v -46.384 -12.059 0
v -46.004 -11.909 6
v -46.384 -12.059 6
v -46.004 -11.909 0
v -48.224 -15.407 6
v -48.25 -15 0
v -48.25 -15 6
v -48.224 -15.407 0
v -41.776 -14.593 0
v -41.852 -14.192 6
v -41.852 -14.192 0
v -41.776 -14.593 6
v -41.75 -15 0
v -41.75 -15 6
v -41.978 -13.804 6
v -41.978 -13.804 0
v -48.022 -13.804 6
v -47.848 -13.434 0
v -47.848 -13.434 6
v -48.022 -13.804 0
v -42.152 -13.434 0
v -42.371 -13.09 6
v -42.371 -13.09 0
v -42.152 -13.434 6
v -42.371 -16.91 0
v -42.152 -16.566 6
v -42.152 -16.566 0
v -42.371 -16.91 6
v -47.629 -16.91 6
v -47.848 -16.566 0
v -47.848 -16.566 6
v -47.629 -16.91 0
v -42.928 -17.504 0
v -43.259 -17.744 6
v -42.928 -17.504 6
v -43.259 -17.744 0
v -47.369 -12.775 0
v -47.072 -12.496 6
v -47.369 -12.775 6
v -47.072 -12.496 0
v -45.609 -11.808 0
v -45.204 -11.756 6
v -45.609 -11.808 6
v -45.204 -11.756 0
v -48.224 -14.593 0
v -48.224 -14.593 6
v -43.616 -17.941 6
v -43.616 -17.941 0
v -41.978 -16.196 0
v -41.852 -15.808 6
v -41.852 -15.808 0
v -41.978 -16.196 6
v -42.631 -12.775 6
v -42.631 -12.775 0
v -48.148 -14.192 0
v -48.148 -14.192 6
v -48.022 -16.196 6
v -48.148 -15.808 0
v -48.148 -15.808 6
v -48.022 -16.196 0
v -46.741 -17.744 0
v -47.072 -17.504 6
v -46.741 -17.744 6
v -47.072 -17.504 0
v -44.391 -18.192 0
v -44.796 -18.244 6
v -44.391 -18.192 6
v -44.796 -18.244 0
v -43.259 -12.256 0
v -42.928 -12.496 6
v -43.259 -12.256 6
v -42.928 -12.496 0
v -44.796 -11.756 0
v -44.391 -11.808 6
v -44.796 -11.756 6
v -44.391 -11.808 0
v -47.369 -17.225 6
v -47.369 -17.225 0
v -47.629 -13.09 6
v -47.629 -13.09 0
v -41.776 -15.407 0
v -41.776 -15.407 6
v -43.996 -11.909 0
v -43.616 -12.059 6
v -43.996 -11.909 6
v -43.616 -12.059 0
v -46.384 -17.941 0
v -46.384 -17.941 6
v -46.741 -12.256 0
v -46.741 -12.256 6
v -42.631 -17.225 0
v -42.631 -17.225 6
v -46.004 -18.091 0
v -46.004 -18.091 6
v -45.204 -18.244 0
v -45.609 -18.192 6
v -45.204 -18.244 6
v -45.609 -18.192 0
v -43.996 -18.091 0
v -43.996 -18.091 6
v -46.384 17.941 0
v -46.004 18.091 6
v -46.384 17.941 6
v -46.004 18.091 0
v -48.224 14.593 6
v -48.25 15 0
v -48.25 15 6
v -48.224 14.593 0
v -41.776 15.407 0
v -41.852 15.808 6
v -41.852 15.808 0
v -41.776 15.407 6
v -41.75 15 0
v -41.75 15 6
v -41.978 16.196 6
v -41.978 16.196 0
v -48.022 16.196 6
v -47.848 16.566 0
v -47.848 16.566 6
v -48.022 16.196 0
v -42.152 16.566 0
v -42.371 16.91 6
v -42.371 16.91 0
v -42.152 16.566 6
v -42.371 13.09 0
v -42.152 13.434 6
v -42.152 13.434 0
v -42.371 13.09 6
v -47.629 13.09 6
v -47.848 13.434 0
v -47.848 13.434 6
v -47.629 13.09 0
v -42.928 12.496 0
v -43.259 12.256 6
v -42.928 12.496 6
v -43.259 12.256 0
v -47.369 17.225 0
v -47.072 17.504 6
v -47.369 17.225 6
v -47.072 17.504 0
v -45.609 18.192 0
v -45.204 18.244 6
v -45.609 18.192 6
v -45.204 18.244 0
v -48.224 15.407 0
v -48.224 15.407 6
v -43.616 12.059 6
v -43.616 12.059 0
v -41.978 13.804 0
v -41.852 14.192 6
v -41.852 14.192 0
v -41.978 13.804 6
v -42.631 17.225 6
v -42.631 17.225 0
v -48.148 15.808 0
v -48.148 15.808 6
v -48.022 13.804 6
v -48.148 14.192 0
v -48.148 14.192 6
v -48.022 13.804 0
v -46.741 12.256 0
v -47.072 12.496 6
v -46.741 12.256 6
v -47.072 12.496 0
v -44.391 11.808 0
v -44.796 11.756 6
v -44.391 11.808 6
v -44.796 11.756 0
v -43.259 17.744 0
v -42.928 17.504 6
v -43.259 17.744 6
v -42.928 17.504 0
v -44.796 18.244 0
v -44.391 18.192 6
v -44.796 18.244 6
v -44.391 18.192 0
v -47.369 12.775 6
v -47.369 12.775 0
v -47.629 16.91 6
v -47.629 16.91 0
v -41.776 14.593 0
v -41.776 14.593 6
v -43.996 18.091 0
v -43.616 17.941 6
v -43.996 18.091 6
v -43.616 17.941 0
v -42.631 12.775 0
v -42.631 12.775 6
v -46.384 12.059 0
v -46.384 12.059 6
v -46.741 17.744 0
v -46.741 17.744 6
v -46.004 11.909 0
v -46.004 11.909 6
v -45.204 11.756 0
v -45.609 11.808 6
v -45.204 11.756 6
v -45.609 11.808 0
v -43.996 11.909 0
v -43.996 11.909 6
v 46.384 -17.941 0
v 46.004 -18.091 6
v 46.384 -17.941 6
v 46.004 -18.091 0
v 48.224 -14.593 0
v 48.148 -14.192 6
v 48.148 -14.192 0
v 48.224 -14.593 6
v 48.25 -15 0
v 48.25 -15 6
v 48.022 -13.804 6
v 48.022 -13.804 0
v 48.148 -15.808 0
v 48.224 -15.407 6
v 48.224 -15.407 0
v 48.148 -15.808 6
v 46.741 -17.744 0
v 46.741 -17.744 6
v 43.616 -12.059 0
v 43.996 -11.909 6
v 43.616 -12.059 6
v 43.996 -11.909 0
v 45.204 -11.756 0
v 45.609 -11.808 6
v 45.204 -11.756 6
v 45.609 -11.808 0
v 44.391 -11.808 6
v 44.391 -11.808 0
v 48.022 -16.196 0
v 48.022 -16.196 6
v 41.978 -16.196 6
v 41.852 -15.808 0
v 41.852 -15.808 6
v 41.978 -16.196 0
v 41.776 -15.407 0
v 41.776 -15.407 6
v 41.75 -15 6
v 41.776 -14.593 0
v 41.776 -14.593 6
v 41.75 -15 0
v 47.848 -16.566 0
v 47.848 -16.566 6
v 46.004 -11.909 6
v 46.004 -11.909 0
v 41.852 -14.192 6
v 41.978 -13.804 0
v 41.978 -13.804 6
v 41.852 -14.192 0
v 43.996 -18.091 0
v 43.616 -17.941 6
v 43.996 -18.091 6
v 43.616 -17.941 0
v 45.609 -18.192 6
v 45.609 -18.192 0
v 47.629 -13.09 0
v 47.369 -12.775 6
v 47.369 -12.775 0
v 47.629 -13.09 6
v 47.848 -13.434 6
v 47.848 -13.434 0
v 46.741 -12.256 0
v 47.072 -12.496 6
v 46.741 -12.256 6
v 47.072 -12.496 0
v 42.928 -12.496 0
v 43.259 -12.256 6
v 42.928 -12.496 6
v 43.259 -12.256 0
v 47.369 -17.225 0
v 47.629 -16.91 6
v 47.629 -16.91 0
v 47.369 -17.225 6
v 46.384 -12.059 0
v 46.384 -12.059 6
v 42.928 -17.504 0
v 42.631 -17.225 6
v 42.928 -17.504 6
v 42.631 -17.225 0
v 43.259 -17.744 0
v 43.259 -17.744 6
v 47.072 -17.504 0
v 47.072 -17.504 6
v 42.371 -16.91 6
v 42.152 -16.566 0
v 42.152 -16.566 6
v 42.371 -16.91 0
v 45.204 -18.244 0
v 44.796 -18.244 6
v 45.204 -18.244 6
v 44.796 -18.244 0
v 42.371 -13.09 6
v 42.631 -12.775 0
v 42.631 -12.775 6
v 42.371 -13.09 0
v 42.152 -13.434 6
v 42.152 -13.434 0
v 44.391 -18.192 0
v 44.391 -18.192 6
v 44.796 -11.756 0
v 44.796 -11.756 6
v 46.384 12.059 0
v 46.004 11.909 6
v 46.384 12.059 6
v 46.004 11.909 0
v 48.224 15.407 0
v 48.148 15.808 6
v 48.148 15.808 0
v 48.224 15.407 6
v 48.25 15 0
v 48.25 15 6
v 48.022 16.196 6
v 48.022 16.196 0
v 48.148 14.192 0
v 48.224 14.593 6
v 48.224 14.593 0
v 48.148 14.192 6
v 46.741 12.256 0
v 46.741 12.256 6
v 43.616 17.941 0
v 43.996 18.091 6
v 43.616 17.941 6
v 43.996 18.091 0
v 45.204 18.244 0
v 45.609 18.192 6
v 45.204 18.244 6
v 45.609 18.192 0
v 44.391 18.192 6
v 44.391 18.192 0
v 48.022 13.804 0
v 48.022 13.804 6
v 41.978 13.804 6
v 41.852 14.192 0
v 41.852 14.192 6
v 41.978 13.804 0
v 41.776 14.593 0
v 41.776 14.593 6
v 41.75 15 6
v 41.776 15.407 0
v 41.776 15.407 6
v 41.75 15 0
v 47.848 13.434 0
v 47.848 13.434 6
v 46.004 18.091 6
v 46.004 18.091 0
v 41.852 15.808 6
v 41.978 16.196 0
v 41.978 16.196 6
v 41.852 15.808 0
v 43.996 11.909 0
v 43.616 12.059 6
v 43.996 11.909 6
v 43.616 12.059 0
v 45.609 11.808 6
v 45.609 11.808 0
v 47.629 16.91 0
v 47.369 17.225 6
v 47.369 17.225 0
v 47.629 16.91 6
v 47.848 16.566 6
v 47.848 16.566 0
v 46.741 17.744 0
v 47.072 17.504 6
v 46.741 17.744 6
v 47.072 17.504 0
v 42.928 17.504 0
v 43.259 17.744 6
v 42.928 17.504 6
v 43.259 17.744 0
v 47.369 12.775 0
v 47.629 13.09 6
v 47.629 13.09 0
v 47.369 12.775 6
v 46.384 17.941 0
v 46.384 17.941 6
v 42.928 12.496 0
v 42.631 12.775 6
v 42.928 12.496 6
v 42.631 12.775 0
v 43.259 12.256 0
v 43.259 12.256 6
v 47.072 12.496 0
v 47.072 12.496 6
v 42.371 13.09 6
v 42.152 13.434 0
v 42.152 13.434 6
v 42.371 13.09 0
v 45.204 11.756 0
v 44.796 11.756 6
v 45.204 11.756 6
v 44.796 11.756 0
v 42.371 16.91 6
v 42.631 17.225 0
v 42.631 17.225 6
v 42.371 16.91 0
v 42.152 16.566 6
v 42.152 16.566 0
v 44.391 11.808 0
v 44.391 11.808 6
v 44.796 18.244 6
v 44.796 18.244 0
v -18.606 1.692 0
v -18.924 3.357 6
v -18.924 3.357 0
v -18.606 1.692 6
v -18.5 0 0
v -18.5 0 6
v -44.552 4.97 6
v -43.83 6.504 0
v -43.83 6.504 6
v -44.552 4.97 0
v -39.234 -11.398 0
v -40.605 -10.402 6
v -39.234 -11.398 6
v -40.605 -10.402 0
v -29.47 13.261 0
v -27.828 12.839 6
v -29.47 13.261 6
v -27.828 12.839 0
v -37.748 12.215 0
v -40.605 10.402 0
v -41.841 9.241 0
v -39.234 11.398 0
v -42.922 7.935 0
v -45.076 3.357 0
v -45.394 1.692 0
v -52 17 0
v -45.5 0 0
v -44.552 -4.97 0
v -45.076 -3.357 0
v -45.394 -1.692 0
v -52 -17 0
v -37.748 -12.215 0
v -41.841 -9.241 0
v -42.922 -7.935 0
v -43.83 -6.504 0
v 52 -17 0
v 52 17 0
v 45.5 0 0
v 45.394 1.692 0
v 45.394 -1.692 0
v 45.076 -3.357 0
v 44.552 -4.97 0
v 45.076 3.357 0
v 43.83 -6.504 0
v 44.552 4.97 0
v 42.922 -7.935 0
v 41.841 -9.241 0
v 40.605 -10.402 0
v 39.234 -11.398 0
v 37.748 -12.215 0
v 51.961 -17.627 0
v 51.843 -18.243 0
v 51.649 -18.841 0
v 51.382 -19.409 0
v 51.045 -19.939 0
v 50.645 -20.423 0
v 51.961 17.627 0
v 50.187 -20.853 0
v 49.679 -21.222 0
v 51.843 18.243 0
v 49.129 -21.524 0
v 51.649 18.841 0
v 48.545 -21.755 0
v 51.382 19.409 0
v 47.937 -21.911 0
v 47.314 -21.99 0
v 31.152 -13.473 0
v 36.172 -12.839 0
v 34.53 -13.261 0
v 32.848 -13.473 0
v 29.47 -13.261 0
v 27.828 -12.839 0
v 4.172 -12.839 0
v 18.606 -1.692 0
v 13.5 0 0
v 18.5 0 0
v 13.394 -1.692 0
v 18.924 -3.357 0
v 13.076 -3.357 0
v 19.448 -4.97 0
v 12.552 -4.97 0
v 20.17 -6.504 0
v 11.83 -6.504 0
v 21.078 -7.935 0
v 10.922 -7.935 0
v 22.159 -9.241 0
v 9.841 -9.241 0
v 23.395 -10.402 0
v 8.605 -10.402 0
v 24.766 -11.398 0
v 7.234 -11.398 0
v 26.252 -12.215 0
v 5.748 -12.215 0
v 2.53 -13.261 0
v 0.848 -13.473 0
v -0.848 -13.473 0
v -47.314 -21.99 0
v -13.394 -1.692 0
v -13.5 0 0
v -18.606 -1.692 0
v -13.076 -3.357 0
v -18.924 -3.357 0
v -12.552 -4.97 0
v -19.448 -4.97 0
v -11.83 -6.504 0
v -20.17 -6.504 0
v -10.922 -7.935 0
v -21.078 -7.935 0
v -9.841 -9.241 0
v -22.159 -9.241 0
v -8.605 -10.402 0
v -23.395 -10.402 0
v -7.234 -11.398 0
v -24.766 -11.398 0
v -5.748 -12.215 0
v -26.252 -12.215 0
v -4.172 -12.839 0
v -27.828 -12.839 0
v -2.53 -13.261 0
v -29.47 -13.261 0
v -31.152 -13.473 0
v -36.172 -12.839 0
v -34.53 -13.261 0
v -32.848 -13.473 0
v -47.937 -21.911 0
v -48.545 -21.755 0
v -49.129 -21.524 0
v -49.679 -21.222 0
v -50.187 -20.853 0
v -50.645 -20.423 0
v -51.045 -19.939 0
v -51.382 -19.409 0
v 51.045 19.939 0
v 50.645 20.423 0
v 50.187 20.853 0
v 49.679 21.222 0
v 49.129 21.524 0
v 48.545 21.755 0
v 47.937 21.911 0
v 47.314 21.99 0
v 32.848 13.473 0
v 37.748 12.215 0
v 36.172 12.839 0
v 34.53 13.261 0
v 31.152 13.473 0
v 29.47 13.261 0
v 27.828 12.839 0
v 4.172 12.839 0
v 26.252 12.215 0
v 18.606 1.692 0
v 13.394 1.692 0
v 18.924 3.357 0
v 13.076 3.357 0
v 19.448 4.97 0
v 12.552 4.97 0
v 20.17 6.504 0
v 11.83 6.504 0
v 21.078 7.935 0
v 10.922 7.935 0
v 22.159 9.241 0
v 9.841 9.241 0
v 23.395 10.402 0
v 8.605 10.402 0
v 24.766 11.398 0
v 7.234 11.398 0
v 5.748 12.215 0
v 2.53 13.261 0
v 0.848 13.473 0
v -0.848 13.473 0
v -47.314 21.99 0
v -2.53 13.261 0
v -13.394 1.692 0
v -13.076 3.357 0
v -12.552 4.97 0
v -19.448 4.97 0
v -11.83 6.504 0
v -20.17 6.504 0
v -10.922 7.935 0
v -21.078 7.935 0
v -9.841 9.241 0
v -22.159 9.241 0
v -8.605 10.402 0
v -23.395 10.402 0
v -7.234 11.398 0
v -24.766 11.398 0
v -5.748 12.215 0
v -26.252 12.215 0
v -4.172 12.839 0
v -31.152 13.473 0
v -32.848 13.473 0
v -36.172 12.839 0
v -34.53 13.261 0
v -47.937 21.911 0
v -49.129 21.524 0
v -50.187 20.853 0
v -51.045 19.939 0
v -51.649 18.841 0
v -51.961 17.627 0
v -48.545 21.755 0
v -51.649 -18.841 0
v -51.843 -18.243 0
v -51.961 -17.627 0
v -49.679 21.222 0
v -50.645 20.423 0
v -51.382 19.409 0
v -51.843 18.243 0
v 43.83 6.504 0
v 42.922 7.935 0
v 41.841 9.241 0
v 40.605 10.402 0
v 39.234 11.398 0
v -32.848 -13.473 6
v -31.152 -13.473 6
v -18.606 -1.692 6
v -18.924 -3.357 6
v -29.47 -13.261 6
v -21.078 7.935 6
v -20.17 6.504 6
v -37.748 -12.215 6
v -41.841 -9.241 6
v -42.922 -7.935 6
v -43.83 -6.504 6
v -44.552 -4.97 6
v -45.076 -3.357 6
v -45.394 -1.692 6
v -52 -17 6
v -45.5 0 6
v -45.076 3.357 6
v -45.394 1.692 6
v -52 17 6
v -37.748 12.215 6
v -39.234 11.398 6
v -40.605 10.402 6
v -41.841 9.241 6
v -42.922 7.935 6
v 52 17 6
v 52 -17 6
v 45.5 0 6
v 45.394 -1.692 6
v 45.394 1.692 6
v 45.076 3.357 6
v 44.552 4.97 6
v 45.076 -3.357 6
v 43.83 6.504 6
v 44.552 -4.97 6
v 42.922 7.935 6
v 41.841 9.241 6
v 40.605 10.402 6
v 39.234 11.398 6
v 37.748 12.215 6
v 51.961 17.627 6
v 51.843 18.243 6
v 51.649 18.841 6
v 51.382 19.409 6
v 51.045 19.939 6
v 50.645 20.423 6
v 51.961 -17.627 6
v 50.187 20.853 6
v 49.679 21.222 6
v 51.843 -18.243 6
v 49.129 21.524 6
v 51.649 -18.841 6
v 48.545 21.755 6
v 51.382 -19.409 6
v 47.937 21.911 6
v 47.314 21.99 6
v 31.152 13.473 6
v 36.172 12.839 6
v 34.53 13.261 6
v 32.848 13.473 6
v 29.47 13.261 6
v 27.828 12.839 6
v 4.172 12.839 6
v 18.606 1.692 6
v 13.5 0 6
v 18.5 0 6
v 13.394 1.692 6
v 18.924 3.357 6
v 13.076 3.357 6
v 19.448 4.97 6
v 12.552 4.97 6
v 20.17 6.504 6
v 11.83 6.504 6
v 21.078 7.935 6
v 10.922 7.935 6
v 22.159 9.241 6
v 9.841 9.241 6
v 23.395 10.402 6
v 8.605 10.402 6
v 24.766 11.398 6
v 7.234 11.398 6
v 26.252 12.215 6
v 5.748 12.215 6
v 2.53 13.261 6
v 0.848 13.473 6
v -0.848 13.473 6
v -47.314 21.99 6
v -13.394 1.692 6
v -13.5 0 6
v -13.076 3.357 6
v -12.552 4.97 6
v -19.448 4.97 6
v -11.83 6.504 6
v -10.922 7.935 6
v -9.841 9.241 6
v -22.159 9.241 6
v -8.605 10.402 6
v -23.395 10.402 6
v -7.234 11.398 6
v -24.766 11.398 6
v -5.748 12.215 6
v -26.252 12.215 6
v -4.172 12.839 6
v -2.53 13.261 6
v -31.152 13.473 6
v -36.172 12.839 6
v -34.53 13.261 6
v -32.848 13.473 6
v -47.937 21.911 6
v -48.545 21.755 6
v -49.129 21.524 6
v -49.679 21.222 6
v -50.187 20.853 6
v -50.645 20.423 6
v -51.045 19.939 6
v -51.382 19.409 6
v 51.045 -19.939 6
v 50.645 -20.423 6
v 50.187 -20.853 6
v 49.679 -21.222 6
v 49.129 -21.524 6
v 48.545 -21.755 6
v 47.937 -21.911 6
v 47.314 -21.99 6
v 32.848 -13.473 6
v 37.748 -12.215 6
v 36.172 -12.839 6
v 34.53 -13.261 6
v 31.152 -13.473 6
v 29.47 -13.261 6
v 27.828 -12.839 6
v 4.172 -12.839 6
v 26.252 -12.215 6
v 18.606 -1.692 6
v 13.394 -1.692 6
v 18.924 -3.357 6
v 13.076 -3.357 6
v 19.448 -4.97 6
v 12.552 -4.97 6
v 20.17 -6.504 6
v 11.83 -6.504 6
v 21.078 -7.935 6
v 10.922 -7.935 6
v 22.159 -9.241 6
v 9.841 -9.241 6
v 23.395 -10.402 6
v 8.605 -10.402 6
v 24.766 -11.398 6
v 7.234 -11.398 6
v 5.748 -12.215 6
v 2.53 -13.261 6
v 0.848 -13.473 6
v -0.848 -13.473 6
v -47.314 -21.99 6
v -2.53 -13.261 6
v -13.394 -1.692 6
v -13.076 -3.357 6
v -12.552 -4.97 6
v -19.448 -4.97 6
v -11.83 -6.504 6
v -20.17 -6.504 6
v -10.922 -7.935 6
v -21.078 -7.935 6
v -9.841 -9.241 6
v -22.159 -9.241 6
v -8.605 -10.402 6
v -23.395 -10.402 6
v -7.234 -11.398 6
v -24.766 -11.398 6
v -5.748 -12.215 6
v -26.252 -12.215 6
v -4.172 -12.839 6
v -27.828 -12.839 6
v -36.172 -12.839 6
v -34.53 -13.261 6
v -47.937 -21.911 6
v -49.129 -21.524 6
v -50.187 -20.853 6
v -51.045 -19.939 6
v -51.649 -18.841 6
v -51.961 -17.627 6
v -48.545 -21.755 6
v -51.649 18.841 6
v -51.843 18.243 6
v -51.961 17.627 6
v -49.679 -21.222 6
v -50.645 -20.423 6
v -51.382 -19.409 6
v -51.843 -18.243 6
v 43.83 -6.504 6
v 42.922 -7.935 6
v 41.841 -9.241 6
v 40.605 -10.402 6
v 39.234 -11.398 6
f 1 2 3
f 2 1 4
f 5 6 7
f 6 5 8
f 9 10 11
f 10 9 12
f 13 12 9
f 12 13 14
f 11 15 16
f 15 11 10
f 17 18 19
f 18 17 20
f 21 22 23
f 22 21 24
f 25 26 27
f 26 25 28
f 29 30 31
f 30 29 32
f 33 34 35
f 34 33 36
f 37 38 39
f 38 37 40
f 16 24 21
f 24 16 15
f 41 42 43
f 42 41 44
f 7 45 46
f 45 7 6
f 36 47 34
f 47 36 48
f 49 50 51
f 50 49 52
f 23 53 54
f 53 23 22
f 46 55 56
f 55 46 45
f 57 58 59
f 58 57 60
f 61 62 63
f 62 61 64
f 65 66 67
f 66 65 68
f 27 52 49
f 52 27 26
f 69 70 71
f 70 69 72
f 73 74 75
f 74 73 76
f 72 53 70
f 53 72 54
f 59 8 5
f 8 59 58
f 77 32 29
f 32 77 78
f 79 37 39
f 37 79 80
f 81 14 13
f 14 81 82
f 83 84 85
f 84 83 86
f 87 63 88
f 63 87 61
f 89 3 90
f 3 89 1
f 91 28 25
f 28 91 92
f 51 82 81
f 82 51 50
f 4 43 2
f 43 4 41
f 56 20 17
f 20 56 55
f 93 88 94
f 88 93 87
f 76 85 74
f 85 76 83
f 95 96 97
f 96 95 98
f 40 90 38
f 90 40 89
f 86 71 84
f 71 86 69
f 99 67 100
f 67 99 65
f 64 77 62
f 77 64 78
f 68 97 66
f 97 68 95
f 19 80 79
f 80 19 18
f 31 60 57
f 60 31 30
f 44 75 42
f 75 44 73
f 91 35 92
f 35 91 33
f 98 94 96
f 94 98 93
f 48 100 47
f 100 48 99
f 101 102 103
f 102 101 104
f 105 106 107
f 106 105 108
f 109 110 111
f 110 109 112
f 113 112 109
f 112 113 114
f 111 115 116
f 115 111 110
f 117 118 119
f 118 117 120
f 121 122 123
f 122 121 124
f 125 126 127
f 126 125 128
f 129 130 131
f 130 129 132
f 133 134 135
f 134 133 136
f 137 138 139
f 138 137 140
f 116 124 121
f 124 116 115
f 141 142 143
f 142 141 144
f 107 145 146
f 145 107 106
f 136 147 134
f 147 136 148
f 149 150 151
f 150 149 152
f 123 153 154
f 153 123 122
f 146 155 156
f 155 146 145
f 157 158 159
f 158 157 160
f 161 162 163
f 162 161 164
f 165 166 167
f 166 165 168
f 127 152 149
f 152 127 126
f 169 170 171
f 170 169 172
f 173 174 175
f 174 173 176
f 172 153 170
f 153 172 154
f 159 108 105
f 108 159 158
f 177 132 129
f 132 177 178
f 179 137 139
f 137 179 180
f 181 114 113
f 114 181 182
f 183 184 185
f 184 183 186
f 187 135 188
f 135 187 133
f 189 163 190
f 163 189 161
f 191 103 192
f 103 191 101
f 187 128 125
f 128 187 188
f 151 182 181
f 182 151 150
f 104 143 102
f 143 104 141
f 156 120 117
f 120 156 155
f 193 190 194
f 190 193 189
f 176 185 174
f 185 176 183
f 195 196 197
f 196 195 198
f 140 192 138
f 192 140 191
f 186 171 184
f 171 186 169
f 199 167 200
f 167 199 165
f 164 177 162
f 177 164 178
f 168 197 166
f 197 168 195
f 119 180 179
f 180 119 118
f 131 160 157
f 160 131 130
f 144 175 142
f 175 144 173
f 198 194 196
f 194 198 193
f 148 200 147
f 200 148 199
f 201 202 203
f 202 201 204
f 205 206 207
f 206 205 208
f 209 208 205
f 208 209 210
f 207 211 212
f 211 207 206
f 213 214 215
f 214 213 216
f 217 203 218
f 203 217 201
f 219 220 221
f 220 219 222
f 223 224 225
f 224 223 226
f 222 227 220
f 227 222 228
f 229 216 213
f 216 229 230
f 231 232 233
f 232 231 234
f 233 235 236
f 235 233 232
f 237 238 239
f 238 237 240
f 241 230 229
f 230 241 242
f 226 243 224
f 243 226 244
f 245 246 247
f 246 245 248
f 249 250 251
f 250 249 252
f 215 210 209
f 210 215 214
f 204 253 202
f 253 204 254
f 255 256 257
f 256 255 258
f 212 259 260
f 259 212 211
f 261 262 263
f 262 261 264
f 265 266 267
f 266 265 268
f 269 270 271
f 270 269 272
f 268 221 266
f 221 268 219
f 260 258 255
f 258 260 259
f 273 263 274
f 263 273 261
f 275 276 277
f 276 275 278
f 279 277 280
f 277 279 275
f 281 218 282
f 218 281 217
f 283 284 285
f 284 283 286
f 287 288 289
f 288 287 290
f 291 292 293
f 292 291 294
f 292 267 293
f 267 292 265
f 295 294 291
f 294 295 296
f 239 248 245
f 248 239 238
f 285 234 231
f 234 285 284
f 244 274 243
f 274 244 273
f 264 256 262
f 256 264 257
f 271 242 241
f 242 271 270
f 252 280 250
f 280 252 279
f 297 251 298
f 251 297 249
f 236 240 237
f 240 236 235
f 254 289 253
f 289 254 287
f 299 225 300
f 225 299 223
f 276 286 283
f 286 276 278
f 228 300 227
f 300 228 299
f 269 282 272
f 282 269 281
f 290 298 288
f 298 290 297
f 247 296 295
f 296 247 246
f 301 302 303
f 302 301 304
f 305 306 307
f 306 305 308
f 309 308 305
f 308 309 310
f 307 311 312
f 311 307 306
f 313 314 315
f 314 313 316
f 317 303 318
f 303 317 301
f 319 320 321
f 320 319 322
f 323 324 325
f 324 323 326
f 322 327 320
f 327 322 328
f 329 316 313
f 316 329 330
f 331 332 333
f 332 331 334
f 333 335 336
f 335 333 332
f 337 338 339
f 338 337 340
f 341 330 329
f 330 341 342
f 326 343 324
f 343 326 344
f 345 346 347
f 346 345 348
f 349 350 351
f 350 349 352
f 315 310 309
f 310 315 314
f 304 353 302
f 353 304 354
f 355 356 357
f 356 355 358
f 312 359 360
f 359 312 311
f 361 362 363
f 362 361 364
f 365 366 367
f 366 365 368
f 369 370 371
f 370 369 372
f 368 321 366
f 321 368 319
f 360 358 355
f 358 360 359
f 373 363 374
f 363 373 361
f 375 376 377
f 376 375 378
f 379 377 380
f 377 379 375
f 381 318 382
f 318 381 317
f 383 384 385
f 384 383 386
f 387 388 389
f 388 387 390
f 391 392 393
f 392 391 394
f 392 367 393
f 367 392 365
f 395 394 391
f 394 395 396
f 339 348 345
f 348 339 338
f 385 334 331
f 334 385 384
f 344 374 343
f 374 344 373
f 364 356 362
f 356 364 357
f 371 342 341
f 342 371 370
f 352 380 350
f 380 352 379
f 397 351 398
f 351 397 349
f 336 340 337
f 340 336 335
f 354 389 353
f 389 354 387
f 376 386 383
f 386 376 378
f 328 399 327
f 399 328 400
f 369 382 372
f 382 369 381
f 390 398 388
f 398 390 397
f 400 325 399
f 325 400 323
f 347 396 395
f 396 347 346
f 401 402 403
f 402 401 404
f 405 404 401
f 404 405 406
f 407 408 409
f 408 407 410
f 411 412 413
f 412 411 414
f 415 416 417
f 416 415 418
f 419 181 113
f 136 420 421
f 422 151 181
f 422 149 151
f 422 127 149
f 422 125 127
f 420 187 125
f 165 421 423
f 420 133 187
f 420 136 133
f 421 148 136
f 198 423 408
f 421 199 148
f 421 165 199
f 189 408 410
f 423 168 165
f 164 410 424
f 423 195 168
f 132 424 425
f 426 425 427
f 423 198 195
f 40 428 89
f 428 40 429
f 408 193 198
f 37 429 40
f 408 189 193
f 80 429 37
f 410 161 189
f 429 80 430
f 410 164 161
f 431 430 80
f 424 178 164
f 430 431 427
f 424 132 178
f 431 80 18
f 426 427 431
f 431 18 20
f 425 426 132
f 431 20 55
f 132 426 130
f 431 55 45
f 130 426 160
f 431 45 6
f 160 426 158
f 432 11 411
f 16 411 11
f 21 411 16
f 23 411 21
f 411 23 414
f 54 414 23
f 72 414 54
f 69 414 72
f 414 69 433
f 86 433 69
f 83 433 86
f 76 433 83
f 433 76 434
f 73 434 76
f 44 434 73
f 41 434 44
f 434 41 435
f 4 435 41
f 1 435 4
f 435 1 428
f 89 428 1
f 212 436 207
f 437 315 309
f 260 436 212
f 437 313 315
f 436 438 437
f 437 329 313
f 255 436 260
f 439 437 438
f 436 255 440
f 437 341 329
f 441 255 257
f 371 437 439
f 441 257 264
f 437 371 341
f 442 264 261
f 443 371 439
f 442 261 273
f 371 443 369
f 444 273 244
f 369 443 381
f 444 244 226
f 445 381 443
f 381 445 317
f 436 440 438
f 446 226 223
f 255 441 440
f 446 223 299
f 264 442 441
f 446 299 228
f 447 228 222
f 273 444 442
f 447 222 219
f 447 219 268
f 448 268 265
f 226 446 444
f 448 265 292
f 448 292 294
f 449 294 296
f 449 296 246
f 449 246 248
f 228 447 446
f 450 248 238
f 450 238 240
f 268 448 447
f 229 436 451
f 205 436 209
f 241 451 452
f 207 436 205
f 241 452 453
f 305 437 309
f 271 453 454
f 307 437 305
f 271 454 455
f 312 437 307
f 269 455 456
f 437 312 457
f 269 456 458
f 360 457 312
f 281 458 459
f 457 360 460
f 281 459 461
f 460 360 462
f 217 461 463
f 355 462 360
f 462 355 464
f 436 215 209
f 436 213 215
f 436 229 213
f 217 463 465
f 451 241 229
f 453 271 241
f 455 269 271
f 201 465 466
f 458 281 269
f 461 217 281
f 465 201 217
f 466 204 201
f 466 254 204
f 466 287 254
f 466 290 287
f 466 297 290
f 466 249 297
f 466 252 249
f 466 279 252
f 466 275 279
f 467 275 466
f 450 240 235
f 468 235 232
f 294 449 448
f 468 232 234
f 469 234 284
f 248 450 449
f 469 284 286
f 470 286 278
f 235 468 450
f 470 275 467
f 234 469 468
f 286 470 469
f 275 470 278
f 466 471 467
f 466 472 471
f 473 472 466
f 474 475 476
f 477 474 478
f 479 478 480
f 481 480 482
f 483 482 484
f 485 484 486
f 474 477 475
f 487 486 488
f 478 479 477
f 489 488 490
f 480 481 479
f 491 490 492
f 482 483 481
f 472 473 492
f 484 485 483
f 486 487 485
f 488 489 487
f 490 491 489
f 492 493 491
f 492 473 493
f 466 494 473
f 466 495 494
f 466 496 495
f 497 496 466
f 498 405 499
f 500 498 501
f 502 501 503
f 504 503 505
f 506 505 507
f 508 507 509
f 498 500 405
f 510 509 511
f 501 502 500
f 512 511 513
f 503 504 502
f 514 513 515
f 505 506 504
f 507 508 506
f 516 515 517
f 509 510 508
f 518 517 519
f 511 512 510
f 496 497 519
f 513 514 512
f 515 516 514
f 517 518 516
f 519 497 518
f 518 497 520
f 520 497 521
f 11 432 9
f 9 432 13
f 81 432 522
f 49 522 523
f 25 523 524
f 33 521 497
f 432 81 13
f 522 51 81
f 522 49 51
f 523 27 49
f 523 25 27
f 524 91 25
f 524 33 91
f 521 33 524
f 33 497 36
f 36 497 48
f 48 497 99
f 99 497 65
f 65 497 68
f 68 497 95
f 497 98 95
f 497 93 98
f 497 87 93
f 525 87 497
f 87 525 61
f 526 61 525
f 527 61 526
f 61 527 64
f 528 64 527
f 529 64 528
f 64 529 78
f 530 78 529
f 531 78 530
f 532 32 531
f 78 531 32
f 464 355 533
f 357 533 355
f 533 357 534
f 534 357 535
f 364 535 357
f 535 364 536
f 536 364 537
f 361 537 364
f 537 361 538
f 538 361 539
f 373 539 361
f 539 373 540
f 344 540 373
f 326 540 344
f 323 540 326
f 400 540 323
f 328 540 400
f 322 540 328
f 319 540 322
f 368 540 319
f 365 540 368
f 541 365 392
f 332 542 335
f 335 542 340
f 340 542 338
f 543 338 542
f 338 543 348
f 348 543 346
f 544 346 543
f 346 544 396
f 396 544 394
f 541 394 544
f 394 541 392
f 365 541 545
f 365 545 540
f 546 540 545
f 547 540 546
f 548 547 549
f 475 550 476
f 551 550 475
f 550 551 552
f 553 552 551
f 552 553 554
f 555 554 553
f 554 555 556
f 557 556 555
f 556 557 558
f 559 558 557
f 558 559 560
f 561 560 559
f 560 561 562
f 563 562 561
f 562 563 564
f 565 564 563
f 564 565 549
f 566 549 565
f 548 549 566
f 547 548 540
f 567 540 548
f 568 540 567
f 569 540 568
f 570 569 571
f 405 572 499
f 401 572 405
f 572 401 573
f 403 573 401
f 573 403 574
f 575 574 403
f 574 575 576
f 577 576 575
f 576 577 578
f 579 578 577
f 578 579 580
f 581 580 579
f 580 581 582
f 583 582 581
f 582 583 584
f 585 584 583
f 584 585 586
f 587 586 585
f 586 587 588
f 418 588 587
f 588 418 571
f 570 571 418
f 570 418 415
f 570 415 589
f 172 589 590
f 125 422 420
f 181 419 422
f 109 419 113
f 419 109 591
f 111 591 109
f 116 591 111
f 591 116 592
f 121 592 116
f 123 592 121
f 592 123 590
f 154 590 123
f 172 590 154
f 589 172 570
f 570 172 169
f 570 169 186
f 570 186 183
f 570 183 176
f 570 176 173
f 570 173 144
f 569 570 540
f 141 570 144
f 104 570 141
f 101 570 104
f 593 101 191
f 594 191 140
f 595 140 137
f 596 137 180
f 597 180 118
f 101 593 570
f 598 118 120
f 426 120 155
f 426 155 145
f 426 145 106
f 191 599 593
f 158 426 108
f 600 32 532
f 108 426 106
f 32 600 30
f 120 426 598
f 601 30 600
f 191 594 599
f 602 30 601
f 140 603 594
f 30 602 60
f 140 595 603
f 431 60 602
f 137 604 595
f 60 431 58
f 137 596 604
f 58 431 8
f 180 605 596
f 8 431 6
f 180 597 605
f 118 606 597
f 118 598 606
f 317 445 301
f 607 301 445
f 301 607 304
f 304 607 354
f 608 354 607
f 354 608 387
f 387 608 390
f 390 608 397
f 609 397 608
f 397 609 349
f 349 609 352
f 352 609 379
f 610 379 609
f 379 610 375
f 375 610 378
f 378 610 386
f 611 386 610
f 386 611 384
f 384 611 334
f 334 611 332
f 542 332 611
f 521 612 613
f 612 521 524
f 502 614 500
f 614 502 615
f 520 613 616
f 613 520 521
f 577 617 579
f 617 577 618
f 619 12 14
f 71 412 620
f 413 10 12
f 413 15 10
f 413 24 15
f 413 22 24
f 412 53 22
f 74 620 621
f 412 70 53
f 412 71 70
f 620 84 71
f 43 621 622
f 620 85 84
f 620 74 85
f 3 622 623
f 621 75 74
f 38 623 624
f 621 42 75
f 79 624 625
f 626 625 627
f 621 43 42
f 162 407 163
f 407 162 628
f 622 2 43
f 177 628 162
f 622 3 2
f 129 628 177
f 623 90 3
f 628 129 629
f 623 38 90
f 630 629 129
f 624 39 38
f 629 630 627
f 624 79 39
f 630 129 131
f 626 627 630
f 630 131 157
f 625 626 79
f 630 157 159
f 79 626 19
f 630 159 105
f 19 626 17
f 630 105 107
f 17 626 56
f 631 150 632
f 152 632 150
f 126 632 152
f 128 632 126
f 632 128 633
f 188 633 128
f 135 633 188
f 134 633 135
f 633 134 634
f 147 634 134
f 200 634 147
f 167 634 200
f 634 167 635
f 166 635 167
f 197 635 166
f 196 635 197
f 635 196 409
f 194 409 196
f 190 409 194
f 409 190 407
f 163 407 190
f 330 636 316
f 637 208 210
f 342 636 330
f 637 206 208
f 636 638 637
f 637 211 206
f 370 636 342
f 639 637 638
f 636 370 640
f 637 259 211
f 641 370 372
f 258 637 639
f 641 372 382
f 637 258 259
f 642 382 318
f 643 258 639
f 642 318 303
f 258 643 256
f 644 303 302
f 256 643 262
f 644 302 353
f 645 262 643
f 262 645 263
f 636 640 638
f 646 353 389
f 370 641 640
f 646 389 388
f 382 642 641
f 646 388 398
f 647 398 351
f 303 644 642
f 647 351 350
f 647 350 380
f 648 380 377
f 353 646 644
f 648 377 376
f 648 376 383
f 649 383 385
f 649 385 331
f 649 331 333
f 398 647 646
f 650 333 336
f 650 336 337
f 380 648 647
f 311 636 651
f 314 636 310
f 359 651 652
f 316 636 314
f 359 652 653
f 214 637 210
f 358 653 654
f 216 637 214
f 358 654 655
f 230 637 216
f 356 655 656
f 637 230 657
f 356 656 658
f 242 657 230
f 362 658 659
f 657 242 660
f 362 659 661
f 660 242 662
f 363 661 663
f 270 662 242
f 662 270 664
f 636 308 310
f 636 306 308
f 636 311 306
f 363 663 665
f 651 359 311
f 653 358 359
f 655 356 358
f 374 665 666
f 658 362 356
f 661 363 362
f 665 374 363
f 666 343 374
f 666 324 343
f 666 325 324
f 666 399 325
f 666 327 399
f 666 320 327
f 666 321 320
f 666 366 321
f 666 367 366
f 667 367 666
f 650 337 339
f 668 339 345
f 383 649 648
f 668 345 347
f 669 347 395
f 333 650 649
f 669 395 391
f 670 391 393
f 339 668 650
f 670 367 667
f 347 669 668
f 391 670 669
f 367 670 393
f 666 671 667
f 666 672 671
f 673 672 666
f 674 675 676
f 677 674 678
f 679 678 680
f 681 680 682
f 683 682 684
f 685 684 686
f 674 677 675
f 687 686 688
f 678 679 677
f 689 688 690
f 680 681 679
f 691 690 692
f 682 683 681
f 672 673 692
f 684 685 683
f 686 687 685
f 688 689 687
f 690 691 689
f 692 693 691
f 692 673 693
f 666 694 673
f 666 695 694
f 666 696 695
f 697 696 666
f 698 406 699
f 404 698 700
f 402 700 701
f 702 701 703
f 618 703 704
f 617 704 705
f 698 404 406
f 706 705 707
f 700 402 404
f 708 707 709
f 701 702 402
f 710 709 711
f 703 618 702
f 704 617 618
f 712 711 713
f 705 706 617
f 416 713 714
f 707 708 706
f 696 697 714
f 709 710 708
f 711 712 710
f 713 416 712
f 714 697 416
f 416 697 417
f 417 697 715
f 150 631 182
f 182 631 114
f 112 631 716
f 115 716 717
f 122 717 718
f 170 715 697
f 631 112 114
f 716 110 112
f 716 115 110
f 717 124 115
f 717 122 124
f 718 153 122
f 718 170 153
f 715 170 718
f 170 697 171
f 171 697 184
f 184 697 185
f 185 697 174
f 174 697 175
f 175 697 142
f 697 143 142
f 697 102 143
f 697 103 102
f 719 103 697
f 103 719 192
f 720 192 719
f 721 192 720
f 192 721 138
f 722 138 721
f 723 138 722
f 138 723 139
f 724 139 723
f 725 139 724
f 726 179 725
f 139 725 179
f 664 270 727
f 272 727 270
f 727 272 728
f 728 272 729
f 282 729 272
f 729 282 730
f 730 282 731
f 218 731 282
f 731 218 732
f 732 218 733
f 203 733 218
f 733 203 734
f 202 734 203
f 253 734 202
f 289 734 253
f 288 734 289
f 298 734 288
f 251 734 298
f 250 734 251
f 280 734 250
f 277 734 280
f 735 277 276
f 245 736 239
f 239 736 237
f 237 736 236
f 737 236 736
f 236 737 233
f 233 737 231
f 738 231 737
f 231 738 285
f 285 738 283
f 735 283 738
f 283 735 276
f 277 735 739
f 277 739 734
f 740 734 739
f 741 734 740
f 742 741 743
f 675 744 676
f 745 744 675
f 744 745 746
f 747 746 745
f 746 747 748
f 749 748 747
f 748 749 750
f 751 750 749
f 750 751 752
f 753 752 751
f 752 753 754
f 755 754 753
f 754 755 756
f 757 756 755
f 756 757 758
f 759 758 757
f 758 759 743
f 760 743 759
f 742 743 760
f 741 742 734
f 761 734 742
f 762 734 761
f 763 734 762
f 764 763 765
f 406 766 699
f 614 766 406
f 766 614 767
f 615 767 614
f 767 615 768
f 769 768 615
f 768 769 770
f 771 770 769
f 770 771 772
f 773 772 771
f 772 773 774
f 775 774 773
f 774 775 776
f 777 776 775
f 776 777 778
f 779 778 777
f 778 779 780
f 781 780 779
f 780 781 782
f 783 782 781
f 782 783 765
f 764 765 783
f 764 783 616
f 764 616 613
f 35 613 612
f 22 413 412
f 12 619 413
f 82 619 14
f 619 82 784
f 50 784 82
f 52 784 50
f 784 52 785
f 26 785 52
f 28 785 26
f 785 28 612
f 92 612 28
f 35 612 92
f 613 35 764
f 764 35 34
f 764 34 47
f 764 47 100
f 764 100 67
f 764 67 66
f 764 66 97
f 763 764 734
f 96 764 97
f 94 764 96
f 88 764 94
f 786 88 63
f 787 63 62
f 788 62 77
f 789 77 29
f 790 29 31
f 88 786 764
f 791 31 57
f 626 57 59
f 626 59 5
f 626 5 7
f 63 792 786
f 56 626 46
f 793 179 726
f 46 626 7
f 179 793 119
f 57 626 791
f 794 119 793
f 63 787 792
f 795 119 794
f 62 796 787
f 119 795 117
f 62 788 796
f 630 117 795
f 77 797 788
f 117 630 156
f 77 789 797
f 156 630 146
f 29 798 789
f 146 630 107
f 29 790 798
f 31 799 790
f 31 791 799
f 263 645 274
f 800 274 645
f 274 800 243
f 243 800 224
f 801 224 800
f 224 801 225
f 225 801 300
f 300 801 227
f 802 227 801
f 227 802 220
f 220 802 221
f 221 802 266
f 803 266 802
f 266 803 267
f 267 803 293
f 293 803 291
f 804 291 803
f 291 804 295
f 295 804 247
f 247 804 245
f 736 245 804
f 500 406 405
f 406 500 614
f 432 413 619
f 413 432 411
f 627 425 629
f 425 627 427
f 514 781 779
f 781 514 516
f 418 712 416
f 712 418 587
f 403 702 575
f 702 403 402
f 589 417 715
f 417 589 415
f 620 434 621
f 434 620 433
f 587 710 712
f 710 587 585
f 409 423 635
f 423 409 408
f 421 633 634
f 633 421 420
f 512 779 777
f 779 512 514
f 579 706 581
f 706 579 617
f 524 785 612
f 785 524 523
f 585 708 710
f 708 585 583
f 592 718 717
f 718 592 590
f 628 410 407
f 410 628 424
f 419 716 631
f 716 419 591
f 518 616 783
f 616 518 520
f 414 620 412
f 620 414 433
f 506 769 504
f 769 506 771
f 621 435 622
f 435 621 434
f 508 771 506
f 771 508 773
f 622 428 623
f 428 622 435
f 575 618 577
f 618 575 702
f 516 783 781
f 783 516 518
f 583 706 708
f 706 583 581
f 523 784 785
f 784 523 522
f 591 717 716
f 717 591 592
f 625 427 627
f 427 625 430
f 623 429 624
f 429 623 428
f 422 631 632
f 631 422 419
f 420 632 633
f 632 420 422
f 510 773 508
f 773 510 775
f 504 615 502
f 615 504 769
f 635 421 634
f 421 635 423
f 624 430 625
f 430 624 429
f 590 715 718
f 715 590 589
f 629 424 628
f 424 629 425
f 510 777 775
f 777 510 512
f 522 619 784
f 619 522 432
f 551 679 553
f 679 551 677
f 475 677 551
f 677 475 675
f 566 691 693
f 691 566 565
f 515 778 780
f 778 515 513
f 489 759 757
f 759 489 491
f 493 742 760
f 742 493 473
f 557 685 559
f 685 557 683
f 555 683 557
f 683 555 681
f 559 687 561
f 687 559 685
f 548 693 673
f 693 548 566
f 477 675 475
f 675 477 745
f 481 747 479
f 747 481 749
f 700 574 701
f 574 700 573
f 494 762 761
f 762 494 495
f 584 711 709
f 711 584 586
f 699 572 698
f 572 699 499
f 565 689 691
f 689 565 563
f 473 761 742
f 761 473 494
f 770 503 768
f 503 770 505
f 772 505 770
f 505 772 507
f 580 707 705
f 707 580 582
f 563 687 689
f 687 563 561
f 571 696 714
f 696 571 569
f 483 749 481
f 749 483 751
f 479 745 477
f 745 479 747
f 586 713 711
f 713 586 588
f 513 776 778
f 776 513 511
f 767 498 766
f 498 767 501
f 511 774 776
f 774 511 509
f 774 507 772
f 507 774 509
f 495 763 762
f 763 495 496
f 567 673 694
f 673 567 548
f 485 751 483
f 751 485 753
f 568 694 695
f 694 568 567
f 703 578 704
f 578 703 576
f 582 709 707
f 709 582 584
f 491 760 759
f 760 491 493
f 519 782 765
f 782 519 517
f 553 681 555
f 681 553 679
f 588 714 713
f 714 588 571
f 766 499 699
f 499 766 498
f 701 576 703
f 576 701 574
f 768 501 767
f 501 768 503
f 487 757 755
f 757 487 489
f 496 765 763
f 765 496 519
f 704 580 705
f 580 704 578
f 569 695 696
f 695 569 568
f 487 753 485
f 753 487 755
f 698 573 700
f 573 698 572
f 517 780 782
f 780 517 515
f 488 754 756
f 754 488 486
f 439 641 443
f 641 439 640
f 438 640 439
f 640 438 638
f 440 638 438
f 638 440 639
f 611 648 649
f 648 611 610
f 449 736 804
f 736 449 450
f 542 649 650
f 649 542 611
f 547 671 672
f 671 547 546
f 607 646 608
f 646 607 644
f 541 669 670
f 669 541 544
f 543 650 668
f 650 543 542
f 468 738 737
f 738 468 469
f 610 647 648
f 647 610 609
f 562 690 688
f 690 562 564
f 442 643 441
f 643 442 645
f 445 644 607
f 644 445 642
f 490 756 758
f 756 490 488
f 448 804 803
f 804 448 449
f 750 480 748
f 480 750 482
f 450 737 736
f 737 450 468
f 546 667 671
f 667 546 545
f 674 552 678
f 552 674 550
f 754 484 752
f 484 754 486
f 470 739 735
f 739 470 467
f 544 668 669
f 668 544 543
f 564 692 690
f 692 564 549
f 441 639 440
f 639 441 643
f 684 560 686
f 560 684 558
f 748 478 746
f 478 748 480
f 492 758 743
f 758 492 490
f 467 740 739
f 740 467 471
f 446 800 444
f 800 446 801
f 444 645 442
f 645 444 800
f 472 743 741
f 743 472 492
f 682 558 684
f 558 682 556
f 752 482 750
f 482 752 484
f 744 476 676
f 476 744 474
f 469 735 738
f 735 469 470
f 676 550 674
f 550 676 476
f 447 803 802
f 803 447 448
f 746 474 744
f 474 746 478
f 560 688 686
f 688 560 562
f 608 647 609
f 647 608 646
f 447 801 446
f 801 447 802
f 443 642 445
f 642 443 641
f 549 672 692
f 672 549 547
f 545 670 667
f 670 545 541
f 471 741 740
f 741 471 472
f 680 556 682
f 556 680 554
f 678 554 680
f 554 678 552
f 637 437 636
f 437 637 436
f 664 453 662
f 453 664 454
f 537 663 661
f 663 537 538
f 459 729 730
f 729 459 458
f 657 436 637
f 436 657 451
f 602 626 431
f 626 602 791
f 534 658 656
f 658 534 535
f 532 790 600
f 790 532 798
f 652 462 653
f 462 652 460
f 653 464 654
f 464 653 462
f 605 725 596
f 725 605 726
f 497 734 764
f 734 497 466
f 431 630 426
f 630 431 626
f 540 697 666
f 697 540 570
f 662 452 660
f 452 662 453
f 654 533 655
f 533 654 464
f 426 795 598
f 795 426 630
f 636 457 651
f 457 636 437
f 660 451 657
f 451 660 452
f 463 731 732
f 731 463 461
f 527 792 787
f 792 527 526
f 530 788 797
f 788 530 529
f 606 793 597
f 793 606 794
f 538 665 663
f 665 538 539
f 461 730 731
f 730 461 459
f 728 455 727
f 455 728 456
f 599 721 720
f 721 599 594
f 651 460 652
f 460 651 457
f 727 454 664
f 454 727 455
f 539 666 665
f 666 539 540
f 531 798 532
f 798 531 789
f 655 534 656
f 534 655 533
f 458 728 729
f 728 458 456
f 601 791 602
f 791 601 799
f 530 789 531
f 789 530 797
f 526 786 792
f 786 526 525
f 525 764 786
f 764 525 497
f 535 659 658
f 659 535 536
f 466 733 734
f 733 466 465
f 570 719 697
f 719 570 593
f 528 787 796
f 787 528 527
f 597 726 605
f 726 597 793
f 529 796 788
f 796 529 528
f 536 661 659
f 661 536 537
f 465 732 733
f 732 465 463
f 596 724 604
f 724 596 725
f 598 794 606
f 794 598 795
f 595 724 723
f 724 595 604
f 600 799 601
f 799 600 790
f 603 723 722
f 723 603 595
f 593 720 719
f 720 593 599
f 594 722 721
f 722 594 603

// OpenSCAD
$fn = 50;


difference() {
	union() {
		hull() {
			translate(v = [-47.0000000000, 17.0000000000, 0]) {
				cylinder(h = 6, r = 5);
			}
			translate(v = [47.0000000000, 17.0000000000, 0]) {
				cylinder(h = 6, r = 5);
			}
			translate(v = [-47.0000000000, -17.0000000000, 0]) {
				cylinder(h = 6, r = 5);
			}
			translate(v = [47.0000000000, -17.0000000000, 0]) {
				cylinder(h = 6, r = 5);
			}
		}
	}
	union() {
		#translate(v = [-45.0000000000, -15.0000000000, -100.0000000000]) {
			cylinder(h = 200, r = 3.2500000000);
		}
		#translate(v = [-45.0000000000, 15.0000000000, -100.0000000000]) {
			cylinder(h = 200, r = 3.2500000000);
		}
		#translate(v = [45.0000000000, -15.0000000000, -100.0000000000]) {
			cylinder(h = 200, r = 3.2500000000);
		}
		#translate(v = [45.0000000000, 15.0000000000, -100.0000000000]) {
			cylinder(h = 200, r = 3.2500000000);
		}
		#translate(v = [-32.0000000000, 0, 0]) {
			cylinder(h = 6, r = 13.5000000000);
		}
		#cylinder(h = 6, r = 13.5000000000);
		#translate(v = [32.0000000000, 0, 0]) {
			cylinder(h = 6, r = 13.5000000000);
		}
	}
}
